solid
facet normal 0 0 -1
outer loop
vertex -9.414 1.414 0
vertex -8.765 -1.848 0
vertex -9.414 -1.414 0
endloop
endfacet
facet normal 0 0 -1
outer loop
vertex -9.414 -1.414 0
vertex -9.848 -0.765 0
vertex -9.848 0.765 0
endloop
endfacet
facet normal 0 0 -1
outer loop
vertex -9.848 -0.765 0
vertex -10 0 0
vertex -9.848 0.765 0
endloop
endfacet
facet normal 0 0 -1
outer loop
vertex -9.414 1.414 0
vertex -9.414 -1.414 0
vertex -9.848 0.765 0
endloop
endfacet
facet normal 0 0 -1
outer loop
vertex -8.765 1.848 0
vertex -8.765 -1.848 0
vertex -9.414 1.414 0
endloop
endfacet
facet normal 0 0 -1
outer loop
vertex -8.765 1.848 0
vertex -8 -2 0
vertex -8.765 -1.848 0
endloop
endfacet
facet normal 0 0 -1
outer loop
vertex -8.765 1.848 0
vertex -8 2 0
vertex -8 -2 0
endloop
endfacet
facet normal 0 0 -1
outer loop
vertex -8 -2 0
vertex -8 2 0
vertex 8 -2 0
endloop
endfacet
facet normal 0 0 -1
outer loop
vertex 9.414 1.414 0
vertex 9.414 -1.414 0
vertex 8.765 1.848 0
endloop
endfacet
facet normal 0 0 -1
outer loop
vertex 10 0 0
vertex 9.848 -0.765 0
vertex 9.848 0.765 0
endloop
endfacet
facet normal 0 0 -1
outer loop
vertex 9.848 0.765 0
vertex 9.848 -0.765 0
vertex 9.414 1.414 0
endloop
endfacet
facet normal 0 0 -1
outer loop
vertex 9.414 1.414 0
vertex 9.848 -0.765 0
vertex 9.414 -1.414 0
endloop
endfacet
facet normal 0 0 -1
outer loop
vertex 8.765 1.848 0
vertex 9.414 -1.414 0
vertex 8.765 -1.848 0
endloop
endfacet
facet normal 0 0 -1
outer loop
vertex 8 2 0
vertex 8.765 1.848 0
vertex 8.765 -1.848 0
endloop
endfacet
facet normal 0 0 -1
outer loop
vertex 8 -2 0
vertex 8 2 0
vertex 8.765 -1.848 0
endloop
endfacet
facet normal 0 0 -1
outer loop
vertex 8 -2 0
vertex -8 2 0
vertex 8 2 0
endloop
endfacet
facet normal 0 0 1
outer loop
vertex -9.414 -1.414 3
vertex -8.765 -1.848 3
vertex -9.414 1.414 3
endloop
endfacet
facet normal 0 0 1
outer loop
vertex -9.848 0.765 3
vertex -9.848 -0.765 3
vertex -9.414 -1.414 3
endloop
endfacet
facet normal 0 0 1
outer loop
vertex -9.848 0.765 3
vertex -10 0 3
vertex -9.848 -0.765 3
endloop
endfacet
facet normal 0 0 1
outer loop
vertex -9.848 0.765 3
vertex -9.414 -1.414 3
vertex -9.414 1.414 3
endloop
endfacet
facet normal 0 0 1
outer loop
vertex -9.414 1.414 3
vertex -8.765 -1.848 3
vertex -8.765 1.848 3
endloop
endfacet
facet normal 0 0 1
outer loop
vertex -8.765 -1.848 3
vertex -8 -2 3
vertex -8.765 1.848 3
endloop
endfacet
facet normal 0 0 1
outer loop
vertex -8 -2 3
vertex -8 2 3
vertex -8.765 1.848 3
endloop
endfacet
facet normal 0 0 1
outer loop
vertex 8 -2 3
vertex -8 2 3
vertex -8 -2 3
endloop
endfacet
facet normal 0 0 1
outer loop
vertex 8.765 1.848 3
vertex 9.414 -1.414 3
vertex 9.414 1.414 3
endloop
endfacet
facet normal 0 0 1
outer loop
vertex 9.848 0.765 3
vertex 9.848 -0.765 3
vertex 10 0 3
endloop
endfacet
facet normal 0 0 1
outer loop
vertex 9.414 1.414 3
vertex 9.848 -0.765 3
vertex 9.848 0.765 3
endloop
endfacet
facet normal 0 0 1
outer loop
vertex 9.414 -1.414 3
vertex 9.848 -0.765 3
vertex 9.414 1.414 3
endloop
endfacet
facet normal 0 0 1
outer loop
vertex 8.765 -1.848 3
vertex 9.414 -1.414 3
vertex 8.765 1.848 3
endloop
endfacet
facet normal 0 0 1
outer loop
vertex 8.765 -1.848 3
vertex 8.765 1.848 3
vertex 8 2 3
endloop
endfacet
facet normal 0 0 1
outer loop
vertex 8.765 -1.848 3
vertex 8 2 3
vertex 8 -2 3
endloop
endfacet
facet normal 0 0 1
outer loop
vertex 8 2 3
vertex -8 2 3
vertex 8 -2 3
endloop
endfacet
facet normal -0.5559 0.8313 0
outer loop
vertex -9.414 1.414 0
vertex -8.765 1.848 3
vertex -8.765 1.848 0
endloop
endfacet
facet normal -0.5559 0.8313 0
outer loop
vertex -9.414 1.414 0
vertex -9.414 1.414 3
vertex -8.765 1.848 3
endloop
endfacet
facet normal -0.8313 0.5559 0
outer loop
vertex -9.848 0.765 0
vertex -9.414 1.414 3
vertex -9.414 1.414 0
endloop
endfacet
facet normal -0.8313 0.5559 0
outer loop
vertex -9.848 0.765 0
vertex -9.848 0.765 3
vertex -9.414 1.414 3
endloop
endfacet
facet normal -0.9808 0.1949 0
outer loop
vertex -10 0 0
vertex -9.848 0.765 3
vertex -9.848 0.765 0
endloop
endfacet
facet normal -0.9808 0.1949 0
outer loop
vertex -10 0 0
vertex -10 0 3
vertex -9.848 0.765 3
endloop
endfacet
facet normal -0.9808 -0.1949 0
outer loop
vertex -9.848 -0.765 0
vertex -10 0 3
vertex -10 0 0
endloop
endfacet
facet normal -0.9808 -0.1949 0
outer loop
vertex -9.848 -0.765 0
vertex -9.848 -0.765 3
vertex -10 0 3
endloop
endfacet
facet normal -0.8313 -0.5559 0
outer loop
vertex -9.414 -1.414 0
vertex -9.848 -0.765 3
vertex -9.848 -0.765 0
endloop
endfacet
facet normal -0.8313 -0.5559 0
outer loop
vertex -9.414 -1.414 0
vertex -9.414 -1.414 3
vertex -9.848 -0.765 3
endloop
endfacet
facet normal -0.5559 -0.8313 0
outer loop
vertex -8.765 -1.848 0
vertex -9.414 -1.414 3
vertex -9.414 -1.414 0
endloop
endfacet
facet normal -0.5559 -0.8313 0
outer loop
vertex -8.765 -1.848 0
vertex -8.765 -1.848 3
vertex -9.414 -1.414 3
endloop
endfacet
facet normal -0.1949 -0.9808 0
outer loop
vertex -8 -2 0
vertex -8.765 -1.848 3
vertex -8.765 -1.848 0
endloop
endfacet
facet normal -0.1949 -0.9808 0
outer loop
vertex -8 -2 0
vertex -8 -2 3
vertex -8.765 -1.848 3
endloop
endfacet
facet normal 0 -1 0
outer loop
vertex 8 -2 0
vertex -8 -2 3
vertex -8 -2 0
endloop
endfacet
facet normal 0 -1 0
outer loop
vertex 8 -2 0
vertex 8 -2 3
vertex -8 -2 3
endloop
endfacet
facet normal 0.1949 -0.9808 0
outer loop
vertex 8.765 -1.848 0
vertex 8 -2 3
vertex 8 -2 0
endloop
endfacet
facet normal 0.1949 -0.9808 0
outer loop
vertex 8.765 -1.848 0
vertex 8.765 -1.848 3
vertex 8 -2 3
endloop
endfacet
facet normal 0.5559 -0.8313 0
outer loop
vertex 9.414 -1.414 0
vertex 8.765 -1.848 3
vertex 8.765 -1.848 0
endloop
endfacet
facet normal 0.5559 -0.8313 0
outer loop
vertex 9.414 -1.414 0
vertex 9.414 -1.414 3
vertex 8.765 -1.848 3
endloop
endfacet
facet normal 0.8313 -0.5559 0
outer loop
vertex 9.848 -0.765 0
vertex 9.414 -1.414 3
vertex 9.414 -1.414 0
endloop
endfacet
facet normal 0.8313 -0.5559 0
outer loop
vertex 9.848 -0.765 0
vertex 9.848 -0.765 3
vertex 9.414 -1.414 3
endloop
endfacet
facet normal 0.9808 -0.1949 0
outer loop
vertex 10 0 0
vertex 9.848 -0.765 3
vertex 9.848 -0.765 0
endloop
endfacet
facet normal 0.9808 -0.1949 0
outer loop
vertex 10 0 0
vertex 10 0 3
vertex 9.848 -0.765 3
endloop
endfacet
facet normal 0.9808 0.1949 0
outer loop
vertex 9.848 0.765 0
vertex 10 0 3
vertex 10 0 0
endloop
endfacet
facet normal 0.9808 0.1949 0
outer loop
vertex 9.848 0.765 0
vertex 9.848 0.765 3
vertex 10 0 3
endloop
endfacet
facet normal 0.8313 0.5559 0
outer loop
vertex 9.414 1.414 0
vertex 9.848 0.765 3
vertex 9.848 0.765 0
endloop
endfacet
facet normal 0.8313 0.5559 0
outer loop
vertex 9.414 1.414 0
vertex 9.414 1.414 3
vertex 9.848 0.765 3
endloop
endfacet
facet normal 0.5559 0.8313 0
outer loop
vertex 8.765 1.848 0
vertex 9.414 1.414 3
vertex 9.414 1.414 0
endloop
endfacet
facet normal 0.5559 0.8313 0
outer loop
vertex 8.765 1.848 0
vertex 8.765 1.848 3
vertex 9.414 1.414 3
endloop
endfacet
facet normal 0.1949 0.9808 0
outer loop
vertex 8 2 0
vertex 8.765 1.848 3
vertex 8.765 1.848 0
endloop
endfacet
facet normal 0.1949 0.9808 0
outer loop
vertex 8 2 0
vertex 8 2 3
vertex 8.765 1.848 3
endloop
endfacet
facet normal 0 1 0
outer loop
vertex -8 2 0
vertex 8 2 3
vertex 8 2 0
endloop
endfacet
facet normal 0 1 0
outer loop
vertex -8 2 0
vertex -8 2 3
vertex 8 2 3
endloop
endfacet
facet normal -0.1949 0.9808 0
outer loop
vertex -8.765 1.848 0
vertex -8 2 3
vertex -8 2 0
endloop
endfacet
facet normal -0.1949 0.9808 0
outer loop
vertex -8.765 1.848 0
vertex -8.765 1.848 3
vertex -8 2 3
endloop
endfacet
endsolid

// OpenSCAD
// Generated by scadwright. Do not hand-edit —
// edit the Python source and regenerate.

$fn = 16;

linear_extrude(height=3, center=false) {
    // RoundedSlot
    //  fn     = 16  (input)
    //  length = 20  (input)
    //  width  = 4  (input)
    //  radius = width / 2 = 2
    union() {
        square([16, 4], center=true);
        translate([8, 0, 0]) {
            circle(r=2);
        }
        translate([-8, 0, 0]) {
            circle(r=2);
        }
    }
}
